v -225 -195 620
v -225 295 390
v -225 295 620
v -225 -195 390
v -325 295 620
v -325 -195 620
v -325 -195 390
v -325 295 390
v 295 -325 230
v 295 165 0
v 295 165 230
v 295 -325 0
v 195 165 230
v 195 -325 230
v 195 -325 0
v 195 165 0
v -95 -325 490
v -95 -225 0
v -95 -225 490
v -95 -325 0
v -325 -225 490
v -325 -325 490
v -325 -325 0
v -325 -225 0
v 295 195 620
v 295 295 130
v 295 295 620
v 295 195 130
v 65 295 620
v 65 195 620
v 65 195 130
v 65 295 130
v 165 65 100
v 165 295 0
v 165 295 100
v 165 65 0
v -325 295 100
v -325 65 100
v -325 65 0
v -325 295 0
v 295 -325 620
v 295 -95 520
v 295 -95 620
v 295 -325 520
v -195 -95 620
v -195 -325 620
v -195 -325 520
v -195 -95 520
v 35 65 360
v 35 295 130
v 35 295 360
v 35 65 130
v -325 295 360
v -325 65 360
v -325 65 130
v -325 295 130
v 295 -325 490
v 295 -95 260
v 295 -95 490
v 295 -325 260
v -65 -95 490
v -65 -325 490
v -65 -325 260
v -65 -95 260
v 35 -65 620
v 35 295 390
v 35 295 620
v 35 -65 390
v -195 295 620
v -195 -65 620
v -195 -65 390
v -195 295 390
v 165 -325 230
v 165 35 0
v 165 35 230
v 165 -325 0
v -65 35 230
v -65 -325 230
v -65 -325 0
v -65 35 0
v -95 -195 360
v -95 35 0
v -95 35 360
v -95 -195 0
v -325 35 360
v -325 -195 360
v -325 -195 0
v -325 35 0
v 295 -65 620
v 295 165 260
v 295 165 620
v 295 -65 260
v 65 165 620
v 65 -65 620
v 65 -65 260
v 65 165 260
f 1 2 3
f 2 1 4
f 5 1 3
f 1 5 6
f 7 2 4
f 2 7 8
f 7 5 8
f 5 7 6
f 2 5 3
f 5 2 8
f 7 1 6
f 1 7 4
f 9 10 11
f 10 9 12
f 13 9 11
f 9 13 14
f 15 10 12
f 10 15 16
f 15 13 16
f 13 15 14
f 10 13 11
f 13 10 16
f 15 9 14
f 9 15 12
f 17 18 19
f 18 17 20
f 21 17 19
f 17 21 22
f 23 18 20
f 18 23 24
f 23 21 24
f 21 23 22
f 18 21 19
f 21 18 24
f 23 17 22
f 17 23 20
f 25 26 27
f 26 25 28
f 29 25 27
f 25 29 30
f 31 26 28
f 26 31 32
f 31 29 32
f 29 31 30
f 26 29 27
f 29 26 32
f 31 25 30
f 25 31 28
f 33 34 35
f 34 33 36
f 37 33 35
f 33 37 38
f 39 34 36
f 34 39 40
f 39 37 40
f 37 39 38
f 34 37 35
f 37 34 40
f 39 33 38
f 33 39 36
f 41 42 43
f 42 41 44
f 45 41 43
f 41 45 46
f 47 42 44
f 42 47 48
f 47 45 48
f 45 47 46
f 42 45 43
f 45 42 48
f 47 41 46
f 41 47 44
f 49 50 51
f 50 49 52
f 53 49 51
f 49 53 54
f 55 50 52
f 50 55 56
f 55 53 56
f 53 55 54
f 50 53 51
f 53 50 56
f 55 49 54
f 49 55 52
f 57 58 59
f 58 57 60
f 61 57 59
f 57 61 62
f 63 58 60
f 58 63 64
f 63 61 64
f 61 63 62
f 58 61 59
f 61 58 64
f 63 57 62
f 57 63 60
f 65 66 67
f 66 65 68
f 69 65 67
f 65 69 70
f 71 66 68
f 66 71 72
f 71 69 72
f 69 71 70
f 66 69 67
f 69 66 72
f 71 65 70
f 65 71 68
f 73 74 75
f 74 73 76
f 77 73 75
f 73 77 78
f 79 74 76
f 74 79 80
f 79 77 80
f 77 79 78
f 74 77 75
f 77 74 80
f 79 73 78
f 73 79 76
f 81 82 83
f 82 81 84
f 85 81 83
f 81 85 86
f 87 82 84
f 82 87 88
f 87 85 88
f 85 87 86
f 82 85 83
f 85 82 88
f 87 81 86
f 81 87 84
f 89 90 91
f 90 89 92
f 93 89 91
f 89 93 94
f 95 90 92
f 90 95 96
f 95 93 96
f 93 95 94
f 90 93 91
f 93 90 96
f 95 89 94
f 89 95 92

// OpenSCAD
gap = 30;
layers = 0;
variant = 1;

module block(size_x, size_y, size_z, pos_x, pos_y, pos_z, idx)
{
	col = idx % 6 == 0 ? [ 0, 0, 1 ] :
	      idx % 6 == 1 ? [ 0, 1, 0 ] :
	      idx % 6 == 2 ? [ 0, 1, 1 ] :
	      idx % 6 == 3 ? [ 1, 0, 0 ] :
	      idx % 6 == 4 ? [ 1, 0, 1 ] :
	      idx % 6 == 5 ? [ 1, 1, 0 ] : [ 0, 0, 0 ];
	translate([-2.5, -2.5, 0] * (100+gap)) difference() {
		color(col) translate([pos_x, pos_y, pos_z] * (100 + gap))
			cube([size_x, size_y, size_z] * (100+gap) - [gap, gap, gap], false);
		if (layers > 0)
			color([0.3, 0.3, 0.3]) translate([0, 0, layers * (100+gap)] - [0.5, 0.5, 0.5] * gap)
				cube([5, 5, 5] * (100 + gap), false);
	}
}

if (variant == 1) {
	block(1,4,2,0,1,3,47);
	block(1,4,2,4,0,0,72);
	block(2,1,4,0,0,0,80);
	block(2,1,4,3,4,1,119);
	block(4,2,1,0,3,0,215);
	block(4,2,1,1,0,4,224);
	block(3,2,2,0,3,1,253);
	block(3,2,2,2,0,2,274);
	block(2,3,2,1,2,3,311);
	block(2,3,2,2,0,0,312);
	block(2,2,3,0,1,0,339);
	block(2,2,3,3,2,2,380);
}

if (variant == 2) {
	block(1,2,4,0,0,1,1);
	block(1,2,4,4,3,0,38);
	block(2,4,1,0,1,0,125);
	block(2,4,1,3,0,4,154);
	block(4,1,2,0,4,3,179);
	block(4,1,2,1,0,0,180);
	block(3,2,2,0,2,3,251);
	block(3,2,2,2,1,0,276);
	block(2,3,2,0,2,1,297);
	block(2,3,2,3,0,2,326);
	block(2,2,3,1,0,2,350);
	block(2,2,3,2,3,0,369);
}

if (variant == 3) {
	block(1,4,2,0,0,3,43);
	block(1,4,2,4,1,0,76);
	block(2,1,4,0,4,0,88);
	block(2,1,4,3,0,1,111);
	block(4,2,1,0,0,0,200);
	block(4,2,1,1,3,4,239);
	block(3,2,2,0,0,1,241);
	block(3,2,2,2,3,2,286);
	block(2,3,2,1,0,3,303);
	block(2,3,2,2,2,0,320);
	block(2,2,3,0,2,0,342);
	block(2,2,3,3,1,2,377);
}

if (variant == 4) {
	block(1,2,4,0,3,1,7);
	block(1,2,4,4,0,0,32);
	block(2,4,1,0,0,0,120);
	block(2,4,1,3,1,4,159);
	block(4,1,2,0,0,3,163);
	block(4,1,2,1,4,0,196);
	block(3,2,2,0,1,3,247);
	block(3,2,2,2,2,0,280);
	block(2,3,2,0,0,1,289);
	block(2,3,2,3,2,2,334);
	block(2,2,3,1,3,2,359);
	block(2,2,3,2,0,0,360);
}
